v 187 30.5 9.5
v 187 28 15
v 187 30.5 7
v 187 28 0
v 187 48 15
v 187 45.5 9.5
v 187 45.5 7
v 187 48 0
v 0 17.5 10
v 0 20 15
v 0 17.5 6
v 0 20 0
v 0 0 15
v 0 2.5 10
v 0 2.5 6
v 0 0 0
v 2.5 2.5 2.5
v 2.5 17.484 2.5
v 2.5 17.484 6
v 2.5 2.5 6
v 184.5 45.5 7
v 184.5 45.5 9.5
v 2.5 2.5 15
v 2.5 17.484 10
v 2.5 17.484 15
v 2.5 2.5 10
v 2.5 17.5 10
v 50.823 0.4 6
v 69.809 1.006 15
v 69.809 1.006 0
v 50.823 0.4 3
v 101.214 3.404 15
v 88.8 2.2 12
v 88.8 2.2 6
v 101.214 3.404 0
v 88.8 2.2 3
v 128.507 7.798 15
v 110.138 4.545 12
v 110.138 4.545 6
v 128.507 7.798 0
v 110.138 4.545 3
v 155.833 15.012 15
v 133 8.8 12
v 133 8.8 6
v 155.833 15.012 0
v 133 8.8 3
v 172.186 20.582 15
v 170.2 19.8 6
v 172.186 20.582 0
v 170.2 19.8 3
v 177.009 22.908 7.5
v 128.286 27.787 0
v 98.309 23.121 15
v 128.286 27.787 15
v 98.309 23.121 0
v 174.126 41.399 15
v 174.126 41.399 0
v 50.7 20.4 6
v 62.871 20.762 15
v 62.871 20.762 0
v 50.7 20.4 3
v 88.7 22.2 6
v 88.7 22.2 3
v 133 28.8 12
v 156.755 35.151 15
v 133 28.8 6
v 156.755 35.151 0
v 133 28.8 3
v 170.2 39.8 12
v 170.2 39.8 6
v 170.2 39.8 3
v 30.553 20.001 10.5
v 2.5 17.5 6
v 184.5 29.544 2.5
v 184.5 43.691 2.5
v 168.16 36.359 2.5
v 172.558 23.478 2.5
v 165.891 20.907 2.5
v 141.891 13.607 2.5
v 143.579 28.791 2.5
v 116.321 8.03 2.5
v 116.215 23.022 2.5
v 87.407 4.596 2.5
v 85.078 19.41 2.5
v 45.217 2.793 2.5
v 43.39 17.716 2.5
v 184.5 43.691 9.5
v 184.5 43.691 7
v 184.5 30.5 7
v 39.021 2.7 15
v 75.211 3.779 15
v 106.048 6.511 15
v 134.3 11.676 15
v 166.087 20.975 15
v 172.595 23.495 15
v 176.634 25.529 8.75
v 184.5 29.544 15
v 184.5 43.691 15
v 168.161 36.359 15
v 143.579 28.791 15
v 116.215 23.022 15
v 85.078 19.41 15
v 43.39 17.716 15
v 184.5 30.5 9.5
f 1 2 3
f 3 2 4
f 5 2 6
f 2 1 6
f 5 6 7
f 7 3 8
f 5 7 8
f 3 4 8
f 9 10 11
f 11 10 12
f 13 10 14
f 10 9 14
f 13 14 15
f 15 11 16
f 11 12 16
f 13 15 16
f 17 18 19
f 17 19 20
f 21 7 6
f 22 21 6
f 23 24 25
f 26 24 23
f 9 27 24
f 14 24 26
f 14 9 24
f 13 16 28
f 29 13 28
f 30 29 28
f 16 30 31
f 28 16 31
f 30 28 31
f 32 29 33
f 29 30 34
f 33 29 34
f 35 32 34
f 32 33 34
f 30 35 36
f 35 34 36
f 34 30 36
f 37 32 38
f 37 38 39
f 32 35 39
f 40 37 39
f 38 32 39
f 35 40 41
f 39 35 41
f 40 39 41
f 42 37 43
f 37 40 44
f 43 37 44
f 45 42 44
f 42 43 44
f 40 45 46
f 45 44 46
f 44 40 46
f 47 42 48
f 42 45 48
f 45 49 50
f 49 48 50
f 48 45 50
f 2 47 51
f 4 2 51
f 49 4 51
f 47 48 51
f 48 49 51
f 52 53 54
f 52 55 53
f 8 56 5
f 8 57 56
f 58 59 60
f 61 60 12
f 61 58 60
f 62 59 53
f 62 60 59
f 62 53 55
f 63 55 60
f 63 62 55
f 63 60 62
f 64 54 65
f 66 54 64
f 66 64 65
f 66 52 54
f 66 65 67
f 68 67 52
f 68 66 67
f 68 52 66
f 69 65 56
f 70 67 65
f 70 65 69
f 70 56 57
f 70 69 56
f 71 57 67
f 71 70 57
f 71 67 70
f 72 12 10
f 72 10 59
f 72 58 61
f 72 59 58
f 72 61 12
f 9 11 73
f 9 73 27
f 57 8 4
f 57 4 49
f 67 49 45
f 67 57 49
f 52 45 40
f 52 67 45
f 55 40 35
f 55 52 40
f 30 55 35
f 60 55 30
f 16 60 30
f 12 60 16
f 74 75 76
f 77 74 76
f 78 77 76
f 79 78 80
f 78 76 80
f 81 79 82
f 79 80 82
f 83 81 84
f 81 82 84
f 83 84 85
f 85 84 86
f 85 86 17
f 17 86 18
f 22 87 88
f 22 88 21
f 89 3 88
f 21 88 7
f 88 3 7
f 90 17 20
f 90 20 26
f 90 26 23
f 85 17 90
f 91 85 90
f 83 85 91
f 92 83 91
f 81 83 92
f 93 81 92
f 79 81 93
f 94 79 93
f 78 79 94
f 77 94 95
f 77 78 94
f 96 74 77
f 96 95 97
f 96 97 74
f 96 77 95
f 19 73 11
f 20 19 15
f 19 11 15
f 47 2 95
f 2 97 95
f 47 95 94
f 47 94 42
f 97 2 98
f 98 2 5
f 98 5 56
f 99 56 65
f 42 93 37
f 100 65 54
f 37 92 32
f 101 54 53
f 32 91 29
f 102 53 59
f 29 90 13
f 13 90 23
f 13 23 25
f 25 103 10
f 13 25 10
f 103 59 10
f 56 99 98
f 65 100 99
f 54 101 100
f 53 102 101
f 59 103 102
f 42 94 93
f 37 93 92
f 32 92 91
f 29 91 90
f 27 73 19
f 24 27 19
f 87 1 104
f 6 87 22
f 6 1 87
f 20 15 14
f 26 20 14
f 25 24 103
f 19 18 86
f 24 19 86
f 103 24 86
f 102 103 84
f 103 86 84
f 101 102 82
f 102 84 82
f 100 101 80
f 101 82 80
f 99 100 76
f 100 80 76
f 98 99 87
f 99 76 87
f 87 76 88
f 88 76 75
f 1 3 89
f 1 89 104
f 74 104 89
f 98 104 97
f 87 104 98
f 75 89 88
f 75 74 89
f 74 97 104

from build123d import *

# Parameters (mm, degrees)
F1_DEPTH = 15
F2_T     = -2.5
F3_W     = 15
F3_H     = 4
F4_DEPTH = 2.5
F5_W     = 15
F5_H     = 2.5
F6_DEPTH = 2.5


with BuildPart() as f1:
    # F0 (on Top) → F1 (new body)
    with BuildSketch(Plane.XY):
        with BuildLine():
            add(Edge.make_bspline(
                [(0, 20), (26.9755970884, 19.816727752), (46.8014260213, 20.2568038594), (89.5851012285, 21.5031885108), (131.9952862297, 27.4015600389), (170.1767487359, 38.9735166564), (181.502610445, 44.7581671178), (187, 48)],
                knots=[0, 0, 0, 0, 0.2332078058, 0.4352153014, 0.6544038109, 0.8583919551, 1, 1, 1, 1], degree=3))
            Line((0, 20), (0, 0))
            add(Edge.make_bspline(
                [(0, 0), (18.4551429238, 0), (50.2133915566, 0.1344641457), (89.1027887864, 1.6734689512), (130.8017993965, 6.7965785232), (174.4513926756, 20.7927209361), (175.1257110926, 22.0723256227), (187, 28)],
                knots=[0, 0, 0, 0, 0.2334958179, 0.4354458538, 0.6543967131, 0.8583890467, 1, 1, 1, 1], degree=3))
            Line((187, 28), (187, 48))
        make_face()
    extrude(amount=F1_DEPTH)

    # F2
    f2_openings = [f1.faces().sort_by_distance(p)[0] for p in [
        (93.450425, 16.290534, 15),
    ]]
    offset(amount=F2_T, openings=f2_openings, kind=Kind.INTERSECTION)

    # F3 (on face) → F4 (cut, through all)
    with BuildSketch(Plane(origin=(0, 0, 0), x_dir=(0, -1, 0), z_dir=(-1, 0, 0))):
        with Locations((-10, 8)):
            Rectangle(F3_W, F3_H)
    extrude(amount=-F4_DEPTH, mode=Mode.SUBTRACT)

    # F5 (on face) → F6 (cut, through all)
    with BuildSketch(Plane.YZ.offset(187)):
        with Locations((38, 8.25)):
            Rectangle(F5_W, F5_H)
    extrude(amount=-F6_DEPTH, mode=Mode.SUBTRACT)


solid = f1.part
